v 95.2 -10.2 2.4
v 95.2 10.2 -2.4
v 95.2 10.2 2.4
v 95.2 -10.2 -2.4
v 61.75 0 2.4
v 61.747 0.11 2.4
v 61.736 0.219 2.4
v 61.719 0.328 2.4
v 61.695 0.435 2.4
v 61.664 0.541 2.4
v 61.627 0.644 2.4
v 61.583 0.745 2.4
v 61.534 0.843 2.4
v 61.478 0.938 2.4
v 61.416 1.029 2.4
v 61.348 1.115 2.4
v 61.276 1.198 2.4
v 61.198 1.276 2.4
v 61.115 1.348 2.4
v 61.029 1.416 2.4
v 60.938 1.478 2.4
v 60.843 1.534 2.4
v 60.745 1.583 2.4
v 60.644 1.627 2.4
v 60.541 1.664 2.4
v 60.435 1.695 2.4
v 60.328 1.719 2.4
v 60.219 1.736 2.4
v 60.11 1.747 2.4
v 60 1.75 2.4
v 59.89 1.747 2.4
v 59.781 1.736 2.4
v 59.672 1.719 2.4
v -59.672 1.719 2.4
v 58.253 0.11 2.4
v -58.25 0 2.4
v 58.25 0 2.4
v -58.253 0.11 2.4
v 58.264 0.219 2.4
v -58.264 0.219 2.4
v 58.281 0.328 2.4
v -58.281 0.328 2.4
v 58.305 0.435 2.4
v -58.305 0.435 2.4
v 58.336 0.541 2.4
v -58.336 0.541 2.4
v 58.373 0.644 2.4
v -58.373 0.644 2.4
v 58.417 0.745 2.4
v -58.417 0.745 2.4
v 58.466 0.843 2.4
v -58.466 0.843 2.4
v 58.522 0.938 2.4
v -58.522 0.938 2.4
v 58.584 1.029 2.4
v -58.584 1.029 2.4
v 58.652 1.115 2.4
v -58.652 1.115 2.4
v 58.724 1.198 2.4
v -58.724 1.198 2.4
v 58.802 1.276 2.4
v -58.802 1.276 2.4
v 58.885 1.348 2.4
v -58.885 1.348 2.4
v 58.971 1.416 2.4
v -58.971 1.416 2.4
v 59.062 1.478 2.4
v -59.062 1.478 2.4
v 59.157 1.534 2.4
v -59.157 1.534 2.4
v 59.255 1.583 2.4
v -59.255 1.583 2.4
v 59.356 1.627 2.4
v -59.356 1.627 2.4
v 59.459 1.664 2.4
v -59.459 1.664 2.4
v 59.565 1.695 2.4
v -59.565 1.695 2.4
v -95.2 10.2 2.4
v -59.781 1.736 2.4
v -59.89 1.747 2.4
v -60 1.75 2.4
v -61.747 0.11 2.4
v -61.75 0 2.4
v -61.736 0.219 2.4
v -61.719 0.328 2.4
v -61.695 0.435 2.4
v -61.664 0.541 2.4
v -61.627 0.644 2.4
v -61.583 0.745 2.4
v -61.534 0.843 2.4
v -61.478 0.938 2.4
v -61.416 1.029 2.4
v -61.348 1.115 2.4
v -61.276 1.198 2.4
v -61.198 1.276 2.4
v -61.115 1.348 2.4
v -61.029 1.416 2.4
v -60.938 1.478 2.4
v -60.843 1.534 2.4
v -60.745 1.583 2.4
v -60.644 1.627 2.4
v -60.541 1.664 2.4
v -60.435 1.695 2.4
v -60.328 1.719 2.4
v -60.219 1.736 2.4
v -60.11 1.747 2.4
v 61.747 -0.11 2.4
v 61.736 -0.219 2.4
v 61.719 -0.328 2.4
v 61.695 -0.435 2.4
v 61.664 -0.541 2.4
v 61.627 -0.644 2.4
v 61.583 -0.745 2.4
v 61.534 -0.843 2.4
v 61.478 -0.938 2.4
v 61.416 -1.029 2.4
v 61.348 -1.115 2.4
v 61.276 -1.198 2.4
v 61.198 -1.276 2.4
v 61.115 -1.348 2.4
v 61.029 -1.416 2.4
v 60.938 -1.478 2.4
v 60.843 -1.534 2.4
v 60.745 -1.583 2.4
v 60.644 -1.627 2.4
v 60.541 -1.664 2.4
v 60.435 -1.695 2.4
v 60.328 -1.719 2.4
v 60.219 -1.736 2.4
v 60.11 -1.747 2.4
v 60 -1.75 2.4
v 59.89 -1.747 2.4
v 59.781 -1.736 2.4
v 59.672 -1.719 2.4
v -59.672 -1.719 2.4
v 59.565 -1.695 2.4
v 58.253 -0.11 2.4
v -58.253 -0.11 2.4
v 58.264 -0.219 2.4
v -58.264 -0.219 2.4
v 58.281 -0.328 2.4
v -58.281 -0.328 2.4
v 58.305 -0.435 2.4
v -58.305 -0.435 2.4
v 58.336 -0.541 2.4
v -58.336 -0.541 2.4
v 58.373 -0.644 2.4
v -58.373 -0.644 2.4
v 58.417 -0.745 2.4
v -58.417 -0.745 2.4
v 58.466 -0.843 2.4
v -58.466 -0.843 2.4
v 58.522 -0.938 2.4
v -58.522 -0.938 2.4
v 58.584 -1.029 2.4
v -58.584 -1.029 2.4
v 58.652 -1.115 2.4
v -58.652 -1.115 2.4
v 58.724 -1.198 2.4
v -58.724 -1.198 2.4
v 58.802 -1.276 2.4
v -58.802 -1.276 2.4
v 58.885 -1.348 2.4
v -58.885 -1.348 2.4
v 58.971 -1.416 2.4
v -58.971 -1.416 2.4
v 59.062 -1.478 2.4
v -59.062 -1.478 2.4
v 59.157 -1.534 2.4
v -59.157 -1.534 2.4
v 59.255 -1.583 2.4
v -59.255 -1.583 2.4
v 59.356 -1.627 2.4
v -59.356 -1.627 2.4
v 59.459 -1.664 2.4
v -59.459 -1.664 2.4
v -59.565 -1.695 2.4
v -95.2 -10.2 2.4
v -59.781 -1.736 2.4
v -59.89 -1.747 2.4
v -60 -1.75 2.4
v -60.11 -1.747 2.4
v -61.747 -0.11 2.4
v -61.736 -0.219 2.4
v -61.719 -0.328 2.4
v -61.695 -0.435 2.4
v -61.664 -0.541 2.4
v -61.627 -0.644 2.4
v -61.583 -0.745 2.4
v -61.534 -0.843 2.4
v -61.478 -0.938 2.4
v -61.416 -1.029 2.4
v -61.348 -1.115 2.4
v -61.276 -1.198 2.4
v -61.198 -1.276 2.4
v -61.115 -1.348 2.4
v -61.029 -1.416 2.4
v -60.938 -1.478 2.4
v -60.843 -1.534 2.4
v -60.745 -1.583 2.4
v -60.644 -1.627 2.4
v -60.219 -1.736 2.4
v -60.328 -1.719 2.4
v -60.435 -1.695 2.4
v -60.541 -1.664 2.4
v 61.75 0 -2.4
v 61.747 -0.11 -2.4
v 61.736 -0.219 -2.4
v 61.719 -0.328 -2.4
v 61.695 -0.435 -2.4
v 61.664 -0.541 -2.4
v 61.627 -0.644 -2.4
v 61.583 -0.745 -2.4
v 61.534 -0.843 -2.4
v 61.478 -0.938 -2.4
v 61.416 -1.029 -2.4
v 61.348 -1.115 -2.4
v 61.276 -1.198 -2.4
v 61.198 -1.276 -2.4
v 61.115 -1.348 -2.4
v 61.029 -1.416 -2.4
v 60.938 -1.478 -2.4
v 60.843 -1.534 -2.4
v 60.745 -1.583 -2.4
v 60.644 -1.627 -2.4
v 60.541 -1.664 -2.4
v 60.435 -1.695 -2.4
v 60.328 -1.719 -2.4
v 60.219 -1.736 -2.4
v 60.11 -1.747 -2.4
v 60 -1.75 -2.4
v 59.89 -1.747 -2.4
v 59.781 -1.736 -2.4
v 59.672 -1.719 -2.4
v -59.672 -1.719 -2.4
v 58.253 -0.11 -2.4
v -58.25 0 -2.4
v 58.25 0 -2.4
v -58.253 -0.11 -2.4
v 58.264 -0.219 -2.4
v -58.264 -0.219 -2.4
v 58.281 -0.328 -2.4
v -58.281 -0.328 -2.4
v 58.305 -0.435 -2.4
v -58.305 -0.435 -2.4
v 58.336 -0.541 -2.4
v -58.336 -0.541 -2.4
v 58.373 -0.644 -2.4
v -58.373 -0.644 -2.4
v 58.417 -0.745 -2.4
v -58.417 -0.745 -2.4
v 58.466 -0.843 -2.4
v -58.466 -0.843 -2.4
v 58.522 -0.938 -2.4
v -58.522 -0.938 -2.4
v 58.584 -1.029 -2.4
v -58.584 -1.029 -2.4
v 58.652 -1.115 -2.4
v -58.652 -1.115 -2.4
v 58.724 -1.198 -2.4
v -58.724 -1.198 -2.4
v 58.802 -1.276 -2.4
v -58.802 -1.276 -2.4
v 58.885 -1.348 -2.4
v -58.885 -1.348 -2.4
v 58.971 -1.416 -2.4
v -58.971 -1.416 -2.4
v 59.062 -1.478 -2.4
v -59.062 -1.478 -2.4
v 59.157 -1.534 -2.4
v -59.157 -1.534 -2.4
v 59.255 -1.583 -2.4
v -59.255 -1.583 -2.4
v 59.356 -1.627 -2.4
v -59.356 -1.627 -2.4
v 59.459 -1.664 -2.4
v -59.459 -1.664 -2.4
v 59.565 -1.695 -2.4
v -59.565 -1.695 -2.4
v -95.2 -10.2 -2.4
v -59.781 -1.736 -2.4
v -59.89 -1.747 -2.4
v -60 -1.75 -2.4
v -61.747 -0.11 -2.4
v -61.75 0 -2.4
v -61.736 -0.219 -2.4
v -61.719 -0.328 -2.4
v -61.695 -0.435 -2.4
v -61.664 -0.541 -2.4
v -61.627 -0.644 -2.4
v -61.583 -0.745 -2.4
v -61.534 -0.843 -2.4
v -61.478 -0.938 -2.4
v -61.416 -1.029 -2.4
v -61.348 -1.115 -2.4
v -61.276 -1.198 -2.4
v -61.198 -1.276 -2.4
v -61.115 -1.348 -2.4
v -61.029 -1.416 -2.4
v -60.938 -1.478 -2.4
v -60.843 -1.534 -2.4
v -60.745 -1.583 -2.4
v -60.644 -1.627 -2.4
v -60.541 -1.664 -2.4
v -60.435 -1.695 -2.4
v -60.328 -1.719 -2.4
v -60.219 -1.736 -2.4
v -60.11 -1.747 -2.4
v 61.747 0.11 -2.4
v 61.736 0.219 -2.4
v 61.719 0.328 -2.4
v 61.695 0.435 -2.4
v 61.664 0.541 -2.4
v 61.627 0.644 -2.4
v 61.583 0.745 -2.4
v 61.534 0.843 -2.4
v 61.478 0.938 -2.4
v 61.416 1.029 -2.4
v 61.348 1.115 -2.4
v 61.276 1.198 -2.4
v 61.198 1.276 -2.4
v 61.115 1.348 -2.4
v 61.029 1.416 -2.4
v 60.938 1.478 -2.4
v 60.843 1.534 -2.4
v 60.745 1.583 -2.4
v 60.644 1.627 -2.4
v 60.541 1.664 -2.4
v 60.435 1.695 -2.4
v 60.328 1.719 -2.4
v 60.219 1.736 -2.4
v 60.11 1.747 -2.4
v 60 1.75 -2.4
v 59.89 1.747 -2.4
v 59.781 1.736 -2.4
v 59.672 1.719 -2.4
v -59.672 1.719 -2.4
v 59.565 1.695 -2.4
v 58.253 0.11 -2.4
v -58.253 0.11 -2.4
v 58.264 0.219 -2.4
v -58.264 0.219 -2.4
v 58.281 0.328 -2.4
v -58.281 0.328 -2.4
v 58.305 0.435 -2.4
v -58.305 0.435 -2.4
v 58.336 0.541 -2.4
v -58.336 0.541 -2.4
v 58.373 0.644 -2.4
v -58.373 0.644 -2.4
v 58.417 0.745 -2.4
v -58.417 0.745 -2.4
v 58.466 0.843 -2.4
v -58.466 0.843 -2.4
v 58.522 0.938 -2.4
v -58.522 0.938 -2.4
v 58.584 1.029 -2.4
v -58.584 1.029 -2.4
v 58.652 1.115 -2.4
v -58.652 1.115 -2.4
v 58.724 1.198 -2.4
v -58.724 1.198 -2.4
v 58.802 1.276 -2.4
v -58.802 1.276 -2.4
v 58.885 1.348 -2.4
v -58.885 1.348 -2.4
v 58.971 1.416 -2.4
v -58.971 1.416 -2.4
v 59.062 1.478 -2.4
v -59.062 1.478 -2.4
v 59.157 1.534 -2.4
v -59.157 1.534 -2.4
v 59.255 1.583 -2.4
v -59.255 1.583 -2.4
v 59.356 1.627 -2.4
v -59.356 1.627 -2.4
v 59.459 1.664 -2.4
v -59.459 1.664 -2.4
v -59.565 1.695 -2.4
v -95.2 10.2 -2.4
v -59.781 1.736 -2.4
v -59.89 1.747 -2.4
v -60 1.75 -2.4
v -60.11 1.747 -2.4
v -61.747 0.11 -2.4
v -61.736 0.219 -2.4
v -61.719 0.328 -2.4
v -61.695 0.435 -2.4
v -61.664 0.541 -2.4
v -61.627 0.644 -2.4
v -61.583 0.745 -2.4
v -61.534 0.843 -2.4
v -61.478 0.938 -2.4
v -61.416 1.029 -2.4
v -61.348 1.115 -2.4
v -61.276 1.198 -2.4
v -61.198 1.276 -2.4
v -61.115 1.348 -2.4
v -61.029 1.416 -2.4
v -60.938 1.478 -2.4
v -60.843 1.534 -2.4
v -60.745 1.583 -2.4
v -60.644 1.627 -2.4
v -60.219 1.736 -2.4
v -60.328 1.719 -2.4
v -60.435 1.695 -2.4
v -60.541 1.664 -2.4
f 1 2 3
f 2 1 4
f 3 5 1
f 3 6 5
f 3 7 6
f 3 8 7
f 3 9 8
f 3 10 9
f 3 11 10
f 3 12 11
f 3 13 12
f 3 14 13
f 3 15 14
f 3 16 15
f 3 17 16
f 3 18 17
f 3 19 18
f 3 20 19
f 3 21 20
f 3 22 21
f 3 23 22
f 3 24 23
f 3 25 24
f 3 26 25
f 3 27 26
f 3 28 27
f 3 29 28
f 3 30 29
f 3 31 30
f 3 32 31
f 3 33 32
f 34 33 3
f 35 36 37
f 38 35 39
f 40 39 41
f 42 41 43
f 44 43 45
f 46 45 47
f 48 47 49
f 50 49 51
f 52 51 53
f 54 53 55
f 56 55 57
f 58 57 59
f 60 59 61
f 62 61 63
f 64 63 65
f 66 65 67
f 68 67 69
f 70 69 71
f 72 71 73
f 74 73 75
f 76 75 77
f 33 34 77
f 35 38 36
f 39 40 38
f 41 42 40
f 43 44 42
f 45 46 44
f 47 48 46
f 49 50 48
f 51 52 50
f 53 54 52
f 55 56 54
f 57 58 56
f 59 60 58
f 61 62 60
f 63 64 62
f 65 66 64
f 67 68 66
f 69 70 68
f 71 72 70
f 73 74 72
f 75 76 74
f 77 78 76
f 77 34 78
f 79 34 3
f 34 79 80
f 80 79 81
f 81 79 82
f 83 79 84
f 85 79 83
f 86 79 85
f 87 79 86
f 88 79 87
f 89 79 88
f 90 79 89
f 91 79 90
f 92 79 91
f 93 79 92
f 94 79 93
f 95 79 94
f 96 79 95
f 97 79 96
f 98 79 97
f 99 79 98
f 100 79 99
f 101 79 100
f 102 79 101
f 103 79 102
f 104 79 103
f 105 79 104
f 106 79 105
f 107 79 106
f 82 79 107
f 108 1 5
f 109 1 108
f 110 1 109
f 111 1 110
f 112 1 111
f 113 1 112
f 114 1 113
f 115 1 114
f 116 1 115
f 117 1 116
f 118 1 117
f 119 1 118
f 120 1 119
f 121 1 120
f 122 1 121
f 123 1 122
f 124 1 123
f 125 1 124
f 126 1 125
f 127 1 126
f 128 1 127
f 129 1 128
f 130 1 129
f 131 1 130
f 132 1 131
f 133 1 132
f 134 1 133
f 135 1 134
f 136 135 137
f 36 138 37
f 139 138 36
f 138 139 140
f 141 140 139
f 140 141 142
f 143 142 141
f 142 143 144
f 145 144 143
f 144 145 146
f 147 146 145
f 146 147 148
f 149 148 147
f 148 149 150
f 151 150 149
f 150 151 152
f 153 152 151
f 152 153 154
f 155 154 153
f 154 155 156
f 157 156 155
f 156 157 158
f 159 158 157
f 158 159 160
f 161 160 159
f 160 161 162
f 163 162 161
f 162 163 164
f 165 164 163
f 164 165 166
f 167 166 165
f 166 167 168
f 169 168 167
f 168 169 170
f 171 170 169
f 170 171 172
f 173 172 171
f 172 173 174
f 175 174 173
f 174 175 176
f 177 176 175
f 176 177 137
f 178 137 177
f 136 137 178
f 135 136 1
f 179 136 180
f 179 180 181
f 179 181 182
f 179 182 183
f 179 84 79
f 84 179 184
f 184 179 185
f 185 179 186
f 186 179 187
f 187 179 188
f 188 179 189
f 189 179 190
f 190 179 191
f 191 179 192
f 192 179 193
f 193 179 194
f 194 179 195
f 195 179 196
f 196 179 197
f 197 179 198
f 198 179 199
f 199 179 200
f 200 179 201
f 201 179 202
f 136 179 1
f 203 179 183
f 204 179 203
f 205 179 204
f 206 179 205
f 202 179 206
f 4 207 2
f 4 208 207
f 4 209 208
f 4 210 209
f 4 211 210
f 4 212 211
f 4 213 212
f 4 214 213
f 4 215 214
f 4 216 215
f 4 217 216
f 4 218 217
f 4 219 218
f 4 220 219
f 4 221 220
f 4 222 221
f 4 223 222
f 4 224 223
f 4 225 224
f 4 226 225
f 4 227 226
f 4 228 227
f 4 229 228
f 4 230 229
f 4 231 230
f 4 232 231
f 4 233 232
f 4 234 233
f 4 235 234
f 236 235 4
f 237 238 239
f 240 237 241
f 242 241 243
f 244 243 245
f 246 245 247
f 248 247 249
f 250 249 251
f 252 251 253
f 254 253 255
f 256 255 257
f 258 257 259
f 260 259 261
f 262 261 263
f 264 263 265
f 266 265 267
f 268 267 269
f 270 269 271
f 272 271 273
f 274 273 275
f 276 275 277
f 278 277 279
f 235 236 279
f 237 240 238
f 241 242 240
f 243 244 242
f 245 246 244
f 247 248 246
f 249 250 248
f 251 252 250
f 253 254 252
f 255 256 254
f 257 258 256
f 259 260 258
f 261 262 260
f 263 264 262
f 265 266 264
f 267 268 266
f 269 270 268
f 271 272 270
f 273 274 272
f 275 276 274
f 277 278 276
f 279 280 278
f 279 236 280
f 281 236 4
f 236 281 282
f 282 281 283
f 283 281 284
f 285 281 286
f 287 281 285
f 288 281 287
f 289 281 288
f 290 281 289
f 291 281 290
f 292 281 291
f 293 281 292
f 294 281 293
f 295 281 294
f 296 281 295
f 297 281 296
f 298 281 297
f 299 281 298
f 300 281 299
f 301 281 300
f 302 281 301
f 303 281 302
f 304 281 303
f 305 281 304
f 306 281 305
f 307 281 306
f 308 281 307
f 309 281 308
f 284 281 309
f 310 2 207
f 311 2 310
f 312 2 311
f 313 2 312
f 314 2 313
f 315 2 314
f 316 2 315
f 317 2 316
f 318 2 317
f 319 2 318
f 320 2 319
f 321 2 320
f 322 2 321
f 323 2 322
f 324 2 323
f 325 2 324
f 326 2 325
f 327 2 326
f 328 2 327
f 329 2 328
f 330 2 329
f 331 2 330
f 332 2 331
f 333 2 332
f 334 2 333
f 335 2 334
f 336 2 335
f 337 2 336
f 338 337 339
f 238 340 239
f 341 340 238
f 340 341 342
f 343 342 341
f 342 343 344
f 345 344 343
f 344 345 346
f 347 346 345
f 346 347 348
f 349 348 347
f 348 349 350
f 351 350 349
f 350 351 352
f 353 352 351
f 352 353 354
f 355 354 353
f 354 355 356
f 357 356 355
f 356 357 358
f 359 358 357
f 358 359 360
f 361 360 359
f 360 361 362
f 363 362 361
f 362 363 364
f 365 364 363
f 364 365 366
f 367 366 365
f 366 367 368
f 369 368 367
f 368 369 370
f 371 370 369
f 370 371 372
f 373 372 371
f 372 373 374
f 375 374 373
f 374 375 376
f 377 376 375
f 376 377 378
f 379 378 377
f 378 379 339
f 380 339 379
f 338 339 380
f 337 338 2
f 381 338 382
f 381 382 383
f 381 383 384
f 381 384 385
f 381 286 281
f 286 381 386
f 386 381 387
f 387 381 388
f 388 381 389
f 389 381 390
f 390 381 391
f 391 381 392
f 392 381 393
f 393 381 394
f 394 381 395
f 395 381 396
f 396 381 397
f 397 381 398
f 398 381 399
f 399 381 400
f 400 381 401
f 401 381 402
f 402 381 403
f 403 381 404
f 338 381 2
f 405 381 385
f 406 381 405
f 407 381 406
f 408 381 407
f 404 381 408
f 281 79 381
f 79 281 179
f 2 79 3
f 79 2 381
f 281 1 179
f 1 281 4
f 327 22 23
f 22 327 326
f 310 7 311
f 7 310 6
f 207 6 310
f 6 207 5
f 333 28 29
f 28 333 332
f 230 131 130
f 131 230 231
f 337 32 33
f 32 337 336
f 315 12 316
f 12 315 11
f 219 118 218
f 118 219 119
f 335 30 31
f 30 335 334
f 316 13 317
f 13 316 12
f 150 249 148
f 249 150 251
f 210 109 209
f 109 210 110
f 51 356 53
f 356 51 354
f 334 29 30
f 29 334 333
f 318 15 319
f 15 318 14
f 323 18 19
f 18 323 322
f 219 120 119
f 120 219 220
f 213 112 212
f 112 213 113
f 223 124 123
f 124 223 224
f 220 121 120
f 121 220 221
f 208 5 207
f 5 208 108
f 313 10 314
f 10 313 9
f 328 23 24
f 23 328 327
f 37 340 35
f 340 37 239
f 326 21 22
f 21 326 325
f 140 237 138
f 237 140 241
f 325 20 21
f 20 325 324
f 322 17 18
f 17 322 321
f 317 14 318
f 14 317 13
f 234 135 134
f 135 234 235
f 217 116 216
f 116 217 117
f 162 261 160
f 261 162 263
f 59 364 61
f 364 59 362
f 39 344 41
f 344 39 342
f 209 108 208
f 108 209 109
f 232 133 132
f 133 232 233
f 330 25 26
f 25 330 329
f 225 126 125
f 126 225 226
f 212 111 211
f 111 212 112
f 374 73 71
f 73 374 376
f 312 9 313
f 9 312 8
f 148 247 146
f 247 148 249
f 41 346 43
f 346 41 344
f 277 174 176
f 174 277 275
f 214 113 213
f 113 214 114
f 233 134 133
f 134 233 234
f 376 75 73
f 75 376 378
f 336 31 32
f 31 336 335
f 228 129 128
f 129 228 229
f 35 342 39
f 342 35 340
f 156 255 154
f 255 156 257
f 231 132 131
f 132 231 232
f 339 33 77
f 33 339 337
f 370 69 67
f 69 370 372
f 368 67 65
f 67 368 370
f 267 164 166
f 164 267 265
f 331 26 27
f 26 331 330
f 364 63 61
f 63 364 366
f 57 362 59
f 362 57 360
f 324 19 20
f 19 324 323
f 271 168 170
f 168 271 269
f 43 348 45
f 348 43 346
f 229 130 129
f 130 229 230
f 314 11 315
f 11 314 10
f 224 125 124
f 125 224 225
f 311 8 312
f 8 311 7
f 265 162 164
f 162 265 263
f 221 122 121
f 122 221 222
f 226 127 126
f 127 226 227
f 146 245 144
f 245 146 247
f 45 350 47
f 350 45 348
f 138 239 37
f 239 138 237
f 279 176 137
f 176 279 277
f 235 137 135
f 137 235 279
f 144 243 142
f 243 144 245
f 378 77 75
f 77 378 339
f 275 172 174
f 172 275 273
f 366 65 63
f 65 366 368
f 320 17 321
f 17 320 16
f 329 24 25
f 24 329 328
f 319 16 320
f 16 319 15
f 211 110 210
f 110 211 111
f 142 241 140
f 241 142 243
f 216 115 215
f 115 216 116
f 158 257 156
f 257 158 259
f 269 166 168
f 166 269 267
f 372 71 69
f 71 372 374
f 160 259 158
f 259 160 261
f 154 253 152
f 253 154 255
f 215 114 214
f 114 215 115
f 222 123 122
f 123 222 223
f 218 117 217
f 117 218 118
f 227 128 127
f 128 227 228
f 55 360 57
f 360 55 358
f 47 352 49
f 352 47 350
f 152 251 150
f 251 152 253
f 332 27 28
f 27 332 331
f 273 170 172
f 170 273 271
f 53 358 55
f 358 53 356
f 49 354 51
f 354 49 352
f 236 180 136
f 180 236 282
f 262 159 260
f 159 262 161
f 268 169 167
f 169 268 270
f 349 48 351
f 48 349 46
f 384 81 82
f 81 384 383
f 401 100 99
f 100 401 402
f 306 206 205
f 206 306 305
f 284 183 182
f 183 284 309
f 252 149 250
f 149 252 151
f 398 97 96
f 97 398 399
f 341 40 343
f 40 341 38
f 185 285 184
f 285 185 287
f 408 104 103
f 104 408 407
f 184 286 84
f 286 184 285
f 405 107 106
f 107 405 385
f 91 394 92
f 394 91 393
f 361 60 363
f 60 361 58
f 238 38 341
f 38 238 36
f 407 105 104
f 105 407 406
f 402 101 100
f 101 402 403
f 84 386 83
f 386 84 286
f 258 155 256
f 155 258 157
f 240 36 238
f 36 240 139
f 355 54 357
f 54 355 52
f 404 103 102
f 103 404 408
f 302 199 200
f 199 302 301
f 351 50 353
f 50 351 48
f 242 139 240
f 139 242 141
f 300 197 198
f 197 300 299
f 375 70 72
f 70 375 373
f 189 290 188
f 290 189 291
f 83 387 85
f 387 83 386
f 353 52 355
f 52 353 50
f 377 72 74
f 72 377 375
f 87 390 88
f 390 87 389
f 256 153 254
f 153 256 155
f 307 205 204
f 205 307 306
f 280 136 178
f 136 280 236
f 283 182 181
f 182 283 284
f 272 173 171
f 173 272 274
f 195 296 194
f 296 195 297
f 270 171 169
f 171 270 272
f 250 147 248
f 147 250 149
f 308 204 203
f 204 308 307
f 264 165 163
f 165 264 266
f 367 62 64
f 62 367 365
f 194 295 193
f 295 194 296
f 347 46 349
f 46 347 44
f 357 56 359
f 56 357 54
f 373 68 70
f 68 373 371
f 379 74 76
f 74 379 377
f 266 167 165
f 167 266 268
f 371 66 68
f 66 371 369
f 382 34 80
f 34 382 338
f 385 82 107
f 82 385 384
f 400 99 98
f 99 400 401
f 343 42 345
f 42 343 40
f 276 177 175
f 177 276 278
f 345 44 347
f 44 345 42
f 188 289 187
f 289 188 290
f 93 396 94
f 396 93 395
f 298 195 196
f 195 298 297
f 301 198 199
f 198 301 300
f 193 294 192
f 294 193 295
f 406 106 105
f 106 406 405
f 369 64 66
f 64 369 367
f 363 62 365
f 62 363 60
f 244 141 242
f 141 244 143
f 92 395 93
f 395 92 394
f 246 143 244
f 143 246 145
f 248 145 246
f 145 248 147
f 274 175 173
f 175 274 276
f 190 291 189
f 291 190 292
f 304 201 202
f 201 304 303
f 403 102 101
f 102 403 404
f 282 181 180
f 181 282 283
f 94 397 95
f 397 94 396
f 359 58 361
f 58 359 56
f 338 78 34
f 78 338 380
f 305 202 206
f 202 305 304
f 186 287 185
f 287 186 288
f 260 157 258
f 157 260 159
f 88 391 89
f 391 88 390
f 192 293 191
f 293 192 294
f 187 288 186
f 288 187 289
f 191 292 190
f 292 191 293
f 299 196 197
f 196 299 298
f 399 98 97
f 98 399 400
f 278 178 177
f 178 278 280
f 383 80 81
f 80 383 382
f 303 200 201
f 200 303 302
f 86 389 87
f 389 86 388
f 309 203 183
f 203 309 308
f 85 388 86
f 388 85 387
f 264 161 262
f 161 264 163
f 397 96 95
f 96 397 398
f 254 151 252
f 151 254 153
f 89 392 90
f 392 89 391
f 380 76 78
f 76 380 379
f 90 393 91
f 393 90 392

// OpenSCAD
// file: ../configuration.scad
symfloppy_box_x_size = 140;
symfloppy_box_y_size = 200;
symfloppy_box_z_size = 30;
symfloppy_box_pane_thickness = 4.8;


button_y_front_offset = 15;
button_x_spaces = 18;
button_x_center_offset = -25;


holder_piece_x_from_z_offset = 5;
holder_piece_y_centered_holder_piece_gap = 120;
// file: subpieces/centeredPaneSubPiece.scad
module centeredPaneSubPiece(x_size, y_size, z_size) {
    cube(
        [
            x_size,
            y_size,
            z_size,
        ],
        center = true
    );
}
// main file
use <./subpieces/centeredPaneSubPiece.scad>
include <../configuration.scad>

rightPanePiece();

module rightPanePiece(
    x_size = symfloppy_box_y_size - (symfloppy_box_pane_thickness * 2),
    y_size = symfloppy_box_z_size - (symfloppy_box_pane_thickness * 2),
    pane_thickness = symfloppy_box_pane_thickness,
    holder_piece_y_centered_holder_piece_gap = holder_piece_y_centered_holder_piece_gap
) {
    echo("rightPanePiece", x_size=x_size, y_size=y_size);
    throws_diameter = 3.5;
    _fn = 100;

    difference() {
        centeredPaneSubPiece(x_size, y_size, pane_thickness);

        translate([
            holder_piece_y_centered_holder_piece_gap / 2,
            0,
            0
        ])
            cylinder(d=throws_diameter, h=pane_thickness * 2, center=true, $fn=_fn);

        translate([
            -holder_piece_y_centered_holder_piece_gap / 2,
            0,
            0
        ])
            cylinder(d=throws_diameter, h=pane_thickness * 2, center=true, $fn=_fn);
    }
}
